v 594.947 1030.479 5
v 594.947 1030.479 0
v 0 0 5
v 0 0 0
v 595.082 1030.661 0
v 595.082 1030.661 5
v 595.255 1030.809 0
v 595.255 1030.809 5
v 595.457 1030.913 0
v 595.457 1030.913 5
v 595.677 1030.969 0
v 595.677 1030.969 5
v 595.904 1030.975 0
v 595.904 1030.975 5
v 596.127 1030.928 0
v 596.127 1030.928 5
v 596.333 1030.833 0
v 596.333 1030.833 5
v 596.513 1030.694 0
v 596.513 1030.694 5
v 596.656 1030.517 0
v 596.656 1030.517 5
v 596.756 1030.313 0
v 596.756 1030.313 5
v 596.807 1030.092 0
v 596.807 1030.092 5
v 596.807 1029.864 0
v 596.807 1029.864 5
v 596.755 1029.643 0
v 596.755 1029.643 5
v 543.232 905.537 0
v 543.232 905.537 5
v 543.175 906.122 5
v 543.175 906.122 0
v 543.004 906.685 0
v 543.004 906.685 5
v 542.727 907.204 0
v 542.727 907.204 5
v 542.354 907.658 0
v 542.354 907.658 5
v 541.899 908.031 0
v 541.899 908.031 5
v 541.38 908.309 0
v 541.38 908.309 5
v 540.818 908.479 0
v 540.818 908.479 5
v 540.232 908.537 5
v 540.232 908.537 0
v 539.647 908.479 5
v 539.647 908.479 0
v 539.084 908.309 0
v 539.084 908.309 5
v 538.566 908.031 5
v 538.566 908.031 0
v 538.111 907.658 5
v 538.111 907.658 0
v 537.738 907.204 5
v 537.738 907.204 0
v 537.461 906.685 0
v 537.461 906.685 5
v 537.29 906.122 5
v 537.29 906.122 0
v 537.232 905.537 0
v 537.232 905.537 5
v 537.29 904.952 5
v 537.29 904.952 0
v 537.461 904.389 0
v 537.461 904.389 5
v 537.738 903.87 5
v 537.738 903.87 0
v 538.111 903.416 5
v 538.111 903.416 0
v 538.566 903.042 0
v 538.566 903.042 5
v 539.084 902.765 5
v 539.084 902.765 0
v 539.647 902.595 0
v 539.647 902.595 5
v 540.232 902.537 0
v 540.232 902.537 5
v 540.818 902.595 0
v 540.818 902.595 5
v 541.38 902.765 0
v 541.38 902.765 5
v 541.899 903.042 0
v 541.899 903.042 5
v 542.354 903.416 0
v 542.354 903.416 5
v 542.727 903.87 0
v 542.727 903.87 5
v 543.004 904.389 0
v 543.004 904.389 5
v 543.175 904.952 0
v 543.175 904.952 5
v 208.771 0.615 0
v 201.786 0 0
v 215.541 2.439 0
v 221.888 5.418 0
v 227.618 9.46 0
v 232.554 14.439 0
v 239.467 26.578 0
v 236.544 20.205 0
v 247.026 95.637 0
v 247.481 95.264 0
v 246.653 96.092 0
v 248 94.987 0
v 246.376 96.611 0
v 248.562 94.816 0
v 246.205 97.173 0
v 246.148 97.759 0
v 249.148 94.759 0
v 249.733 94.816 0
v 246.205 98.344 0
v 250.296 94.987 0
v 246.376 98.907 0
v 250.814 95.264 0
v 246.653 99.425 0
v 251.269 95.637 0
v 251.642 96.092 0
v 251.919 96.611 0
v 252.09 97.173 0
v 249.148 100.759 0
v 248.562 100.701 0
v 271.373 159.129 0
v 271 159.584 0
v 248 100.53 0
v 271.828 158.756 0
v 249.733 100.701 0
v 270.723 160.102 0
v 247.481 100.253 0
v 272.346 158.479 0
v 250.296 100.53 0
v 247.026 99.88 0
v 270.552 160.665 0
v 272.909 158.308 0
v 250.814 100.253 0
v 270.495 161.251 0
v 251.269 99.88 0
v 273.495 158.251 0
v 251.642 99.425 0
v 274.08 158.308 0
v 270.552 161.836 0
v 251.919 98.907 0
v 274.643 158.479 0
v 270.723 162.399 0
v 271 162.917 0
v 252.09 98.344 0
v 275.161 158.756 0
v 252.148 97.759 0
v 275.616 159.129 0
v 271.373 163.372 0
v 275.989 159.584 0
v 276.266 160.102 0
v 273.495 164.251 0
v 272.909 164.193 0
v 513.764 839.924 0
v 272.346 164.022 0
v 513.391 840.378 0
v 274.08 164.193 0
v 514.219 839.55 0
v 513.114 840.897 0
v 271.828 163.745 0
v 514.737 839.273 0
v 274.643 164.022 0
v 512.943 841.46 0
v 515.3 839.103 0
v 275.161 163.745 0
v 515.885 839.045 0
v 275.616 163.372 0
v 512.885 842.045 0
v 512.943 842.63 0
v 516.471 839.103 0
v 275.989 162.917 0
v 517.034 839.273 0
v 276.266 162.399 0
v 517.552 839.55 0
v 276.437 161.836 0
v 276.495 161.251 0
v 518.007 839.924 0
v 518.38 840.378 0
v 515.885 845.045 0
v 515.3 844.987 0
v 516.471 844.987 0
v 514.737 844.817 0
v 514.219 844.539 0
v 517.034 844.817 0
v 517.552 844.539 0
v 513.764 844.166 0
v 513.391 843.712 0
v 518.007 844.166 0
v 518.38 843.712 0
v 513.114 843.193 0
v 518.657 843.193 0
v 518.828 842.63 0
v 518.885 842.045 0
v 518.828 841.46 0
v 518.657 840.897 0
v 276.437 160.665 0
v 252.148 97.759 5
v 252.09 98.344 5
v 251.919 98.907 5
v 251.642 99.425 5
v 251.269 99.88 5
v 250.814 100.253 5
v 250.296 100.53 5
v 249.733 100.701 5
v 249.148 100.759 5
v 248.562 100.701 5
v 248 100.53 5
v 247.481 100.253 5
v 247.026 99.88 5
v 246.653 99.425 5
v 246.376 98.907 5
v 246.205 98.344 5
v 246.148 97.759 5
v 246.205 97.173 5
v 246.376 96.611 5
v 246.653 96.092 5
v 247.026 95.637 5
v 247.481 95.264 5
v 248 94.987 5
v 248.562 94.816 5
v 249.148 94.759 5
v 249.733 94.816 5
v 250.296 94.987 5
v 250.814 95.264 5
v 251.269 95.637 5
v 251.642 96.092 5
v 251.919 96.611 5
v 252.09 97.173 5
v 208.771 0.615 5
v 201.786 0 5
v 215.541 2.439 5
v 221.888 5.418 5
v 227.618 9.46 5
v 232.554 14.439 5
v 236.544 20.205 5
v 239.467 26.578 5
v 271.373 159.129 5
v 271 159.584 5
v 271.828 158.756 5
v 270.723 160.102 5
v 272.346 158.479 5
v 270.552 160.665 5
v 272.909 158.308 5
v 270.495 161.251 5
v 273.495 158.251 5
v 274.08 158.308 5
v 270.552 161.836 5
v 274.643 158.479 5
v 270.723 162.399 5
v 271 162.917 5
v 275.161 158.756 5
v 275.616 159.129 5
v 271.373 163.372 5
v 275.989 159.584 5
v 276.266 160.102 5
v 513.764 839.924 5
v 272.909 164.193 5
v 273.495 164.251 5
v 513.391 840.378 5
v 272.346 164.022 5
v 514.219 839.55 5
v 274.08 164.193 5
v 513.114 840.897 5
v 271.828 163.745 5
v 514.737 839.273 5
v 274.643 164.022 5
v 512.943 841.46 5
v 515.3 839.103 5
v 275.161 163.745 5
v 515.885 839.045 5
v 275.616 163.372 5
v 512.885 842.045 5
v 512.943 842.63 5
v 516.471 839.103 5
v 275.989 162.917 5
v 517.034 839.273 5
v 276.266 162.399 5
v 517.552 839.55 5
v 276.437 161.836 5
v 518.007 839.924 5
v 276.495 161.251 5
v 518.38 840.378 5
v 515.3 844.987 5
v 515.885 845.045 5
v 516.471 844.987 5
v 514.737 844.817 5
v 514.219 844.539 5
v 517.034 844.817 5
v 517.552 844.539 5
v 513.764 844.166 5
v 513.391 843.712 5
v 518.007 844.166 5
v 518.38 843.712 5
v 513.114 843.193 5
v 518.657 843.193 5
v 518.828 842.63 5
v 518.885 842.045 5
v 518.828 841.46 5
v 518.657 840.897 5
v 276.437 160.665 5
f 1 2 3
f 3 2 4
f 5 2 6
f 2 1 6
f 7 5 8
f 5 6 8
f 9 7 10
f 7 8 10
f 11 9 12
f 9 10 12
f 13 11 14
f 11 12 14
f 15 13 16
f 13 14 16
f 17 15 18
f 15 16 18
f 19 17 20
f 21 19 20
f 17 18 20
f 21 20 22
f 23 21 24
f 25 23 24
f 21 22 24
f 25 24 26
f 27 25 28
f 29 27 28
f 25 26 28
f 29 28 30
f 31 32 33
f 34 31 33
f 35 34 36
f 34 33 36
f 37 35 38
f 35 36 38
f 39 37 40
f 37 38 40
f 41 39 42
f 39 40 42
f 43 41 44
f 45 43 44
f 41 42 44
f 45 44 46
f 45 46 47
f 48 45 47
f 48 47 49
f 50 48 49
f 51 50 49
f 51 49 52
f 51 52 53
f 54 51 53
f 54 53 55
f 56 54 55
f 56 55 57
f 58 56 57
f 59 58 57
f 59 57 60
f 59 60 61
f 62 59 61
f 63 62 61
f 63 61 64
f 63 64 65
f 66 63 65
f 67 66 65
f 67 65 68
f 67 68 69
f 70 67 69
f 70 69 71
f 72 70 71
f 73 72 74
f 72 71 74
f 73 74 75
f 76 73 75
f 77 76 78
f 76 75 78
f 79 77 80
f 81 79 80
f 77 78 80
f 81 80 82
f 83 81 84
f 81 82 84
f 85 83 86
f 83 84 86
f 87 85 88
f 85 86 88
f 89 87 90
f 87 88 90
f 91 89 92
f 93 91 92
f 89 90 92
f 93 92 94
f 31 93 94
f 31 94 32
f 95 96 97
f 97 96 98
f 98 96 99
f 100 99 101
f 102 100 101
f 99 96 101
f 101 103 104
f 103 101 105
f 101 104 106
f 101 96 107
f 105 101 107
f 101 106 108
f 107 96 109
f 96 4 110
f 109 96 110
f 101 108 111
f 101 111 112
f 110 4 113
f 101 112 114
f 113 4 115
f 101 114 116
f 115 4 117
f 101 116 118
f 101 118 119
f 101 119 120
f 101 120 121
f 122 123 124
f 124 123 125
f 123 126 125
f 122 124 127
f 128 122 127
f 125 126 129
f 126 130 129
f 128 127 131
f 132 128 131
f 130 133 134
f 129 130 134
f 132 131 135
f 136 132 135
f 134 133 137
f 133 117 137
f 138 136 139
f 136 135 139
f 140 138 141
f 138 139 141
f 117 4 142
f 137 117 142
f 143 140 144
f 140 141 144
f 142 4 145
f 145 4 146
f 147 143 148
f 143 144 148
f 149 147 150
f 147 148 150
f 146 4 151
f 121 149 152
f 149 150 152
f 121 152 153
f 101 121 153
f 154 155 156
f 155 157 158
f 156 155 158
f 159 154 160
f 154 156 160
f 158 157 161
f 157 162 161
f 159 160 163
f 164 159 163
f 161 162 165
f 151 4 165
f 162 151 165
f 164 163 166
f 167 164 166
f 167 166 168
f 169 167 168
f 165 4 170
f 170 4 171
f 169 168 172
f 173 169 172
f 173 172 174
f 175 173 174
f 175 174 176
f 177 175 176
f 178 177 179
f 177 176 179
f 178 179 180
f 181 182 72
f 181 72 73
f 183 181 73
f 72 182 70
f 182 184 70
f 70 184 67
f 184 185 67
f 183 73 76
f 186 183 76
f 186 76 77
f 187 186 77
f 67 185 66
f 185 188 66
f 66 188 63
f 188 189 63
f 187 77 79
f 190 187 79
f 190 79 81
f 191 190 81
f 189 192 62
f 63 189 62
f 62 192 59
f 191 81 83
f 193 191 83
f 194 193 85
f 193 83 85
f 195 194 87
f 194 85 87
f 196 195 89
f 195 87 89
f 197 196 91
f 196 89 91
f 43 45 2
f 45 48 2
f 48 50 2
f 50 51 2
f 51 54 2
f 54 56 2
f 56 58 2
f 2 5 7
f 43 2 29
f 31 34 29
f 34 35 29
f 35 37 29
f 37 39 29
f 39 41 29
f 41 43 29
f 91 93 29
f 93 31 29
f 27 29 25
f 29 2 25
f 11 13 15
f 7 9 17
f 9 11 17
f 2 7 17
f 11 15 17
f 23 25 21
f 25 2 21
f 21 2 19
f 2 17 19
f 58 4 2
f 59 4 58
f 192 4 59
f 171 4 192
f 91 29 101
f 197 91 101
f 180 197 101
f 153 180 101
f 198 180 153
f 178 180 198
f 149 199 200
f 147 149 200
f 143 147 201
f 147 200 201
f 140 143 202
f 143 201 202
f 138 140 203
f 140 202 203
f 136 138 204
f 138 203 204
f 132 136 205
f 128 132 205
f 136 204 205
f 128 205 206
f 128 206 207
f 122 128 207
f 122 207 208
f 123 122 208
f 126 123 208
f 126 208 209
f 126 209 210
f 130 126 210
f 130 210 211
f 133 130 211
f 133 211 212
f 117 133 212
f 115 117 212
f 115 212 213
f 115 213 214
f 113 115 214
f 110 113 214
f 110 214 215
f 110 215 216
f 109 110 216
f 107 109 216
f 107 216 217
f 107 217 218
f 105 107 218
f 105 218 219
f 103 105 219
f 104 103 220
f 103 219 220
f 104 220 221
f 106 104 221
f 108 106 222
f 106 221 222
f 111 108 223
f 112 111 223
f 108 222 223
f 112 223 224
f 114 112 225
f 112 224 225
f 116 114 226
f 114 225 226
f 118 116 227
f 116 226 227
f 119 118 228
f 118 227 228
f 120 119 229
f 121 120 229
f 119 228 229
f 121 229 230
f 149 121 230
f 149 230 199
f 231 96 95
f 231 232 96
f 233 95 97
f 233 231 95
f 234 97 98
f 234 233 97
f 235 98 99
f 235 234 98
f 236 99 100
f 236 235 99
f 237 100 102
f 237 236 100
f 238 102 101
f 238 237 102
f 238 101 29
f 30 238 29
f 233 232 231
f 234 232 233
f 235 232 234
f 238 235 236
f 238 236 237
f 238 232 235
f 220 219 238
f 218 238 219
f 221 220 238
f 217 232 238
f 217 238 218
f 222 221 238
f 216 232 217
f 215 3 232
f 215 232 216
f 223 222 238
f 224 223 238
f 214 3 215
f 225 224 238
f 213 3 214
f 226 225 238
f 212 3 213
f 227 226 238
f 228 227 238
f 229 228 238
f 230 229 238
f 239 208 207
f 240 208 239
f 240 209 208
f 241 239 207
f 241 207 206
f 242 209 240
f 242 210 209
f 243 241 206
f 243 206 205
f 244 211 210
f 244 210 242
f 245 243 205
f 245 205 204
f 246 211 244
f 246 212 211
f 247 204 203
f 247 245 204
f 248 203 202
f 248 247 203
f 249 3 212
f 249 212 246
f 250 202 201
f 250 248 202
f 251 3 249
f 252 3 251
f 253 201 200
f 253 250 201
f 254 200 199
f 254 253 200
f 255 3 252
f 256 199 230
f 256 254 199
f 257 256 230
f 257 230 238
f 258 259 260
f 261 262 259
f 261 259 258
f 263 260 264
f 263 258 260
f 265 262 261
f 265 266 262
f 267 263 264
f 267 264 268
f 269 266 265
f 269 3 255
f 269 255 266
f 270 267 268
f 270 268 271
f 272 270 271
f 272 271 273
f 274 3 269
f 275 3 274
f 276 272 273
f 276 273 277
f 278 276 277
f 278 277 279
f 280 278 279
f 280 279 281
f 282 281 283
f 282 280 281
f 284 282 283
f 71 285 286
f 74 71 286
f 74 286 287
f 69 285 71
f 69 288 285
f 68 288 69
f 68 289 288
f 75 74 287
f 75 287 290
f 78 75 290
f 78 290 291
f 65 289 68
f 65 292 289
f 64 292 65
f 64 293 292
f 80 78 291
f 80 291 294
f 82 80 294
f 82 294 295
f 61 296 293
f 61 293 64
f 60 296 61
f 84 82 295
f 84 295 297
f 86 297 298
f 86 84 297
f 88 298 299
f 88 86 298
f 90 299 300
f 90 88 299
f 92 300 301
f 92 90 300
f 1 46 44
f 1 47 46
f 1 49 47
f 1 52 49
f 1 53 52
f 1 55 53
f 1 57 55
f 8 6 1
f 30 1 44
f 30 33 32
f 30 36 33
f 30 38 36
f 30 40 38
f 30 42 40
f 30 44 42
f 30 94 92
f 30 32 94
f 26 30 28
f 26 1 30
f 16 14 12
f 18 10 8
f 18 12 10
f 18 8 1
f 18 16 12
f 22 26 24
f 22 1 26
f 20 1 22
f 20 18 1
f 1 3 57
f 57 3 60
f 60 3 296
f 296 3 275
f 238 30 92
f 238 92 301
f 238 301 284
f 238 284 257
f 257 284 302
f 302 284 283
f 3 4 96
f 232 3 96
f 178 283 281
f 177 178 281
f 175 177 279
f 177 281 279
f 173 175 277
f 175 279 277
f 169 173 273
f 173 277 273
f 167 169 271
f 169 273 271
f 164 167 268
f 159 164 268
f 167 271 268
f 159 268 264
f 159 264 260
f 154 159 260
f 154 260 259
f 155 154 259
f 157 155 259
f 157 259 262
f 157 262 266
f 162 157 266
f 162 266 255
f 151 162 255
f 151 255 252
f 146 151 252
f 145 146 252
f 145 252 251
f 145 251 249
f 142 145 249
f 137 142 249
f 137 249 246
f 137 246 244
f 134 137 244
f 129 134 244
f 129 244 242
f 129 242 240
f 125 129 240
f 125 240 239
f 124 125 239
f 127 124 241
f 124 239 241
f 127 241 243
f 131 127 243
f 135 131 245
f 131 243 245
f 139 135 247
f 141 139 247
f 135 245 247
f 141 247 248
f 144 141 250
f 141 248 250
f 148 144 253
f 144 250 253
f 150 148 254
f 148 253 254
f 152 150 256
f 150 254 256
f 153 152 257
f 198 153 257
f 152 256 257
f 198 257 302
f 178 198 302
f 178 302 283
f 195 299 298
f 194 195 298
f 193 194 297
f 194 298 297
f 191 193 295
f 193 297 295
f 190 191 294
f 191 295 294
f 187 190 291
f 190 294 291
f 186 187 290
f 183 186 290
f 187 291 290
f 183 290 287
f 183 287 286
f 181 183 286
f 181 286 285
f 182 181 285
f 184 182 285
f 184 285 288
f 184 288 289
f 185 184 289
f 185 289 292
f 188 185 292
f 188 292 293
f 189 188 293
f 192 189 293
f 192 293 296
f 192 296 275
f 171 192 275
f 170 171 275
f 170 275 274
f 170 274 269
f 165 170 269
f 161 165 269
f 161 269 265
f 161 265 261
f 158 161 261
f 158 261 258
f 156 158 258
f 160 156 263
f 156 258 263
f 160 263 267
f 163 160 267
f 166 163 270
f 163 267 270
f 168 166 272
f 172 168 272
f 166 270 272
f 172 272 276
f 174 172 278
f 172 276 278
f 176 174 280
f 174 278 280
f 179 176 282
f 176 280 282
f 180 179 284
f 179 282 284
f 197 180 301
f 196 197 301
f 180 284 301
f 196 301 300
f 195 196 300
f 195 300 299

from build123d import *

# Parameters (mm, degrees)
BOSS_EXTRUDE1_DEPTH = 5
FILLET1_R           = 40
FILLET2_R           = 1
SKETCH2_R           = 3
CUT_EXTRUDE1_DEPTH  = 1192.271634267


with BuildPart() as part:
    # Sketch1 → Boss-Extrude1 (new body)
    with BuildSketch(Plane.XY):
        Polygon((0, 0), (230, 0), (600.444279957, 1040), align=None)
    extrude(amount=BOSS_EXTRUDE1_DEPTH)

    # Fillet1
    fillet1_edges = [part.edges().sort_by_distance(p)[0] for p in [
        (230, 0, 2.5),
    ]]
    fillet(fillet1_edges, radius=FILLET1_R)

    # Fillet2
    fillet2_edges = [part.edges().sort_by_distance(p)[0] for p in [
        (600.444279957, 1040, 2.5),
    ]]
    fillet(fillet2_edges, radius=FILLET2_R)

    # Sketch2 → Cut-Extrude1 (cut, through all)
    with BuildSketch(Plane.XY.offset(5)):
        with Locations((249.147691634, 97.758565682)):
            Circle(SKETCH2_R)
        with Locations((273.494533389, 161.250543889)):
            Circle(SKETCH2_R)
        with Locations((515.885480129, 842.044902128)):
            Circle(SKETCH2_R)
        with Locations((540.232321884, 905.536880334)):
            Circle(SKETCH2_R)
    extrude(amount=-CUT_EXTRUDE1_DEPTH, mode=Mode.SUBTRACT)


solid = part.part
